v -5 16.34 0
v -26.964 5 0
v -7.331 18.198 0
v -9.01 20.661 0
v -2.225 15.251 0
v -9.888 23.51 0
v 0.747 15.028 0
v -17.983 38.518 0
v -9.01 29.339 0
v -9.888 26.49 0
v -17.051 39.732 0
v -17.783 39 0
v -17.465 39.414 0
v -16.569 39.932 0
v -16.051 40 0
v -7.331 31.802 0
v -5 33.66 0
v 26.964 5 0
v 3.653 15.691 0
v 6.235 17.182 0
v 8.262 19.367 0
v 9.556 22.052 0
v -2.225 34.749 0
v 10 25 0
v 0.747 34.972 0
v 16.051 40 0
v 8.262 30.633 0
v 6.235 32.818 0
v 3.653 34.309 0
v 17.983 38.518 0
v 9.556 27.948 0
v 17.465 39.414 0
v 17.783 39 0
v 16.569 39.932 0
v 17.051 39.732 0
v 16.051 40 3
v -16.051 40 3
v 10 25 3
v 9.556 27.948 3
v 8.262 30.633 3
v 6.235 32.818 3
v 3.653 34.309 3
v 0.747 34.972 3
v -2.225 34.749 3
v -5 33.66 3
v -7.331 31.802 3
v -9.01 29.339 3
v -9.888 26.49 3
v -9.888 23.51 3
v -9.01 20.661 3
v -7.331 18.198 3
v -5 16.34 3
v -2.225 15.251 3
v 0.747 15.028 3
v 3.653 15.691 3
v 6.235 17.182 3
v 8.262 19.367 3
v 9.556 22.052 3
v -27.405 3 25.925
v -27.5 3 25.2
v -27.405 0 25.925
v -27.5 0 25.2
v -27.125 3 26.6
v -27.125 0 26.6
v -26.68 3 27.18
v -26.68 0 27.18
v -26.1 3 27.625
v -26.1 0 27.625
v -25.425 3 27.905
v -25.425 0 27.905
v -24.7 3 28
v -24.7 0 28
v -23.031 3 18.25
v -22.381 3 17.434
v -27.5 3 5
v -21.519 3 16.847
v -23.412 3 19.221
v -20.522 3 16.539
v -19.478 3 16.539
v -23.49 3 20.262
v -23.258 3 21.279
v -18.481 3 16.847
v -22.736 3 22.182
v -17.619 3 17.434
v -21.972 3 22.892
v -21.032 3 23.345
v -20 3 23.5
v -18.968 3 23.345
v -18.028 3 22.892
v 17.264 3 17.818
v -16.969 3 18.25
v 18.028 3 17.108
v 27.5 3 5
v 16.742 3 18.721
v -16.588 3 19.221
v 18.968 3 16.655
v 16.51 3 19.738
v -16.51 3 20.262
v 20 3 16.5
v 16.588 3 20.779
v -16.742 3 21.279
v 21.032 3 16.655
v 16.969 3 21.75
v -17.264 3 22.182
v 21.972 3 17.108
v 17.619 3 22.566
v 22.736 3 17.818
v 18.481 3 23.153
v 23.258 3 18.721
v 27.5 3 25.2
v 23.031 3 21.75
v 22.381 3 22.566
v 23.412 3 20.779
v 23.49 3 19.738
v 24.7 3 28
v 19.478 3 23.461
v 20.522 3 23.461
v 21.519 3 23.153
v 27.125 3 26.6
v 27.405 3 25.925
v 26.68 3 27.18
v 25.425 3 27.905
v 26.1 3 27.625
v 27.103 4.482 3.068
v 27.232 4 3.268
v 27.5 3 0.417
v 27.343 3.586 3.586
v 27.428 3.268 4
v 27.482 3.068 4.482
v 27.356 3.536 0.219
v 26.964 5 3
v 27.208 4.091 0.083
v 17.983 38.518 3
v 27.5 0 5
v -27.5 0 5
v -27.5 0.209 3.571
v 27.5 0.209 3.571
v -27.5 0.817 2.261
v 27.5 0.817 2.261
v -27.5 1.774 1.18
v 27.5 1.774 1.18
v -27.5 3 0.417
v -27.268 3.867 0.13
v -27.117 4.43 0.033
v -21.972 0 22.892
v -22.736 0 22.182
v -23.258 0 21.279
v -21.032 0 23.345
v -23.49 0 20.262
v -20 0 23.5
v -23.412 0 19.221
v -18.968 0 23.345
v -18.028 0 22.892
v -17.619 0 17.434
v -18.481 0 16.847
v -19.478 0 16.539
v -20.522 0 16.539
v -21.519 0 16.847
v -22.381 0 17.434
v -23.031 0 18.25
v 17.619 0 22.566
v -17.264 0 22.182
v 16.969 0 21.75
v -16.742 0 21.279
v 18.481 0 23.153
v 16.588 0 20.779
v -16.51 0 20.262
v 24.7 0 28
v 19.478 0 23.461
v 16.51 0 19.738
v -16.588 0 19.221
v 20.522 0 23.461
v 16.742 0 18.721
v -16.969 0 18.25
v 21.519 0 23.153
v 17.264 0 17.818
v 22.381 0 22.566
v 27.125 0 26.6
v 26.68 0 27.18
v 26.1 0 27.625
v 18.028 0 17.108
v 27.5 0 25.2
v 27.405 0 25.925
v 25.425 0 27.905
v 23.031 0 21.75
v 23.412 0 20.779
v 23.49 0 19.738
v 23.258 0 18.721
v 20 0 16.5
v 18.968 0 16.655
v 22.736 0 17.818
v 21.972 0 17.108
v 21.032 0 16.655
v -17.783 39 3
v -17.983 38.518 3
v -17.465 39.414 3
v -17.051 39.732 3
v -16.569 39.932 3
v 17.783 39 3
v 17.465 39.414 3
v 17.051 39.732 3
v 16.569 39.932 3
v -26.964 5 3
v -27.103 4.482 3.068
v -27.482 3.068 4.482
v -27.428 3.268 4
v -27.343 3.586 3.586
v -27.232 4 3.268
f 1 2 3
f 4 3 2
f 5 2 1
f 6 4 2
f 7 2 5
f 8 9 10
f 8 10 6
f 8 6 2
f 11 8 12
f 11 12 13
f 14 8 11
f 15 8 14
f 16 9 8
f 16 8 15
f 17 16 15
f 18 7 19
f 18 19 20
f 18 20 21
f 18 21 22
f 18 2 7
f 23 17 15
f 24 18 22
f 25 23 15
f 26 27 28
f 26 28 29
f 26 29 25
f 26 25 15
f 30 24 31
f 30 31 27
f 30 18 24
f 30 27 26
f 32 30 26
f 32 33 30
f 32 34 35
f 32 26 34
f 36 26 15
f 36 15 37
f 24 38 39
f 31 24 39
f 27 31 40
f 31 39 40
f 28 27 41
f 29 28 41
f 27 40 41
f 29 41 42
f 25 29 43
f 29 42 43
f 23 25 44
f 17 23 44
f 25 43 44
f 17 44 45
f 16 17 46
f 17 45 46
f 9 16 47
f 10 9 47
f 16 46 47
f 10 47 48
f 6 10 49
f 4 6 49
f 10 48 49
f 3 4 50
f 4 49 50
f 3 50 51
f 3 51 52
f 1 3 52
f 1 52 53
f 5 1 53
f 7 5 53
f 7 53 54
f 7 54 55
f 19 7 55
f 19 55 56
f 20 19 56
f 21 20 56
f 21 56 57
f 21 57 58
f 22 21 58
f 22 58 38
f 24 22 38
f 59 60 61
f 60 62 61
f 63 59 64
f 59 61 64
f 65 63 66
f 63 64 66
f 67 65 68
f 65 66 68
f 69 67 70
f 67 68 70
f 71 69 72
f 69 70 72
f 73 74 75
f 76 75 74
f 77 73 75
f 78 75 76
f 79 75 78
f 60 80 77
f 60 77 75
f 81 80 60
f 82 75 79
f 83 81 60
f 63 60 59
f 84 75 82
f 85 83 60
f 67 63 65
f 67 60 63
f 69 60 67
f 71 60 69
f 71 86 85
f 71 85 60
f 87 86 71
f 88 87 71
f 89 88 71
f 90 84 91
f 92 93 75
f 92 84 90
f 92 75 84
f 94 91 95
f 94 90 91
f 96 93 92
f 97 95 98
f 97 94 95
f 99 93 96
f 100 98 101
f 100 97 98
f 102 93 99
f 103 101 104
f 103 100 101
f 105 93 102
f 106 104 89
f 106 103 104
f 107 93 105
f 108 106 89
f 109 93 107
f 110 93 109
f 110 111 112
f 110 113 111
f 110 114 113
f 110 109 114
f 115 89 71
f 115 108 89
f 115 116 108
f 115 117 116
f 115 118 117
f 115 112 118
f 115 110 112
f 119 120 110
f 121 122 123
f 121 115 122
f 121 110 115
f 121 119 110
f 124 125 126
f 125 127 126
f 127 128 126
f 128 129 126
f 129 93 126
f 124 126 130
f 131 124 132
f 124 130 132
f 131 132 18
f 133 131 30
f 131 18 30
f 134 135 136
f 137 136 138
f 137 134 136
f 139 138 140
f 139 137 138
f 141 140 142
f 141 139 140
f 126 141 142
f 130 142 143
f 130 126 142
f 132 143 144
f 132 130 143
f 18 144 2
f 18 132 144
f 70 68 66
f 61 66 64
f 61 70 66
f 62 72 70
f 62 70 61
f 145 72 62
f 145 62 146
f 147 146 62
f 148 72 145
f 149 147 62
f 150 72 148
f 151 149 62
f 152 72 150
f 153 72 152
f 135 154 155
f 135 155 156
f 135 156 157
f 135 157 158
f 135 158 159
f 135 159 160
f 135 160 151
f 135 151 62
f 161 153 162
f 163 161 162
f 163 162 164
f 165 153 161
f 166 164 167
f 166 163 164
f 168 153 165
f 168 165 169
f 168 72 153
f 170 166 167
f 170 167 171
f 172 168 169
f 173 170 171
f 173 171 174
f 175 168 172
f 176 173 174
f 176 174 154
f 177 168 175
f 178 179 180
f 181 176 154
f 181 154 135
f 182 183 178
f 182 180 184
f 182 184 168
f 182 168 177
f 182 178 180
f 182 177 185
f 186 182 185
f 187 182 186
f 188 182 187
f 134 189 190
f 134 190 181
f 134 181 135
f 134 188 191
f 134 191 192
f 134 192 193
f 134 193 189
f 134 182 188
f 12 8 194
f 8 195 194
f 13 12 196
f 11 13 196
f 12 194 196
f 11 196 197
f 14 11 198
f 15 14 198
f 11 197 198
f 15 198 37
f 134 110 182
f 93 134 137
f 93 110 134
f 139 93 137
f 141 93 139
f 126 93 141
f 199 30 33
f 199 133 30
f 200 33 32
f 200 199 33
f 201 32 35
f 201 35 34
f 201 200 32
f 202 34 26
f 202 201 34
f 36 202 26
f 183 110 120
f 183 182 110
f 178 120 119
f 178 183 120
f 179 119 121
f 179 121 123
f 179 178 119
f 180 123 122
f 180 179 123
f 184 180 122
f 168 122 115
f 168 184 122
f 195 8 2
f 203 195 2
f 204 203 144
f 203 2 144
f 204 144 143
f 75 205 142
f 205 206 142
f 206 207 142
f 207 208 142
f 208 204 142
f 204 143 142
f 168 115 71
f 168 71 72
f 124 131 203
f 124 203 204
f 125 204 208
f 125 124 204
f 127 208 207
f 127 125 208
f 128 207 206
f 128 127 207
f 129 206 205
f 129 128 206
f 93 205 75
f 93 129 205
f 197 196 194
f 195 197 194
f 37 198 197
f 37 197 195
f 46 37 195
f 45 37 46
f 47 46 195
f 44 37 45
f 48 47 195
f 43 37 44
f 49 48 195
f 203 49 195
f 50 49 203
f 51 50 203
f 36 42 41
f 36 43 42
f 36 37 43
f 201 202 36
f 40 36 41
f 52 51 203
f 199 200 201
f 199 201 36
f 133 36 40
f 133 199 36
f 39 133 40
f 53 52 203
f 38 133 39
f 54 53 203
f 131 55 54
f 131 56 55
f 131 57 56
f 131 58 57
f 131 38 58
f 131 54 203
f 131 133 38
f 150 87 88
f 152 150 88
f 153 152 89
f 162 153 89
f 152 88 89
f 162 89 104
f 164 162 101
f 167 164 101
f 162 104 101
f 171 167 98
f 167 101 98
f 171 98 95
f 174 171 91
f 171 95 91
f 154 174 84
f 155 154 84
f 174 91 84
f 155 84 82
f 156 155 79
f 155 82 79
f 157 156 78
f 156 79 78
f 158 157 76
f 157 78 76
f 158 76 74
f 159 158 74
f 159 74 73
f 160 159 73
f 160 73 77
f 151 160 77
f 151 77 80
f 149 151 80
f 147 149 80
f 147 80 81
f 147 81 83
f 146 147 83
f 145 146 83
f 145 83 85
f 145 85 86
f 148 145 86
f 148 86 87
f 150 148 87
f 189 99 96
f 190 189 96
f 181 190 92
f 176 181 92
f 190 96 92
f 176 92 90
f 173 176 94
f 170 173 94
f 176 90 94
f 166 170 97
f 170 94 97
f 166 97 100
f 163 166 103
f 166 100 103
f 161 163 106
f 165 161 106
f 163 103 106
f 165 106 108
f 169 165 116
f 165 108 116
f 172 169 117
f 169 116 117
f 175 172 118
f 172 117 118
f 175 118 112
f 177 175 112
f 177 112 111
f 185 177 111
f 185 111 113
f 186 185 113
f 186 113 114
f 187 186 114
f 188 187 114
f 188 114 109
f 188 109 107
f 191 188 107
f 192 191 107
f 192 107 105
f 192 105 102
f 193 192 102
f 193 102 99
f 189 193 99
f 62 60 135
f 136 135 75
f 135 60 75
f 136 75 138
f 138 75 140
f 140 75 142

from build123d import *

# Parameters (mm, degrees)
EXTRUDE_START            = 27.5
EXTRUDE_1_DEPTH          = 55
SKETCH_4_R               = 10
CUT_EXTRUDE_1_DEPTH      = 55.60082417
CUT_EXTRUDE_2_DEPTH      = 55.60082417
CUT_EXTRUDE_2_DEPTH_BACK = 55.60082417
SKETCH_6_R               = 3.5
CUT_EXTRUDE_3_DEPTH      = 54.937463789
FILLET_1_R               = 2
FILLET_2_R               = 2.8


with BuildPart() as part:
    # 草图3 → 凸台-拉伸1 (new body)
    with BuildSketch(Plane(origin=(0, 0, 0), x_dir=(0, 0, -1), z_dir=(1, 0, 0)).offset(EXTRUDE_START)):
        with BuildLine():
            Line((-28, 0), (-5, 0))
            ThreePointArc((-5, 0), (-1.464466094, 1.464466094), (0, 5))
            Line((0, 5), (0, 40))
            Line((0, 40), (-3, 40))
            Line((-3, 40), (-3, 5))
            ThreePointArc((-3, 5), (-3.585786438, 3.585786438), (-5, 3))
            Line((-5, 3), (-28, 3))
            Line((-28, 3), (-28, 0))
        make_face()
    extrude(amount=-EXTRUDE_1_DEPTH)

    # 草图4 → 切除-拉伸1 (cut, through all)
    with BuildSketch(Plane.XY.offset(3)):
        with Locations((0, 25)):
            Circle(SKETCH_4_R)
    extrude(amount=-CUT_EXTRUDE_1_DEPTH, mode=Mode.SUBTRACT)

    # 草图5 → 切除-拉伸2 (cut, two sides: drawn at the far end of the back side and taken through both)
    with BuildSketch(Plane.XY.offset(3).offset(-CUT_EXTRUDE_2_DEPTH_BACK)):
        Polygon((-17.58587988, 40), (-27.5, 3), (-27.5, 50), (27.5, 50), (27.5, 3), (17.58587988, 40), align=None)
    extrude(amount=CUT_EXTRUDE_2_DEPTH + CUT_EXTRUDE_2_DEPTH_BACK, mode=Mode.SUBTRACT)

    # 草图6 → 切除-拉伸3 (cut, through all)
    with BuildSketch(Plane(origin=(0, 3, 0), x_dir=(1, 0, 0), z_dir=(0, 1, 0))):
        with Locations(Location((-20, -20, 0), (0, 0, 270))):
            Circle(SKETCH_6_R)
        with Locations(Location((20, -20, 0), (0, 0, 90))):
            Circle(SKETCH_6_R)
    extrude(amount=-CUT_EXTRUDE_3_DEPTH, mode=Mode.SUBTRACT)

    # 圆角1
    fillet_1_edges = [part.edges().sort_by_distance(p)[0] for p in [
        (17.58587988, 40, 1.5),
        (-17.58587988, 40, 1.5),
    ]]
    fillet(fillet_1_edges, radius=FILLET_1_R)

    # 圆角2
    fillet_2_edges = [part.edges().sort_by_distance(p)[0] for p in [
        (27.5, 1.5, 28),
        (-27.5, 1.5, 28),
    ]]
    fillet(fillet_2_edges, radius=FILLET_2_R)


solid = part.part
